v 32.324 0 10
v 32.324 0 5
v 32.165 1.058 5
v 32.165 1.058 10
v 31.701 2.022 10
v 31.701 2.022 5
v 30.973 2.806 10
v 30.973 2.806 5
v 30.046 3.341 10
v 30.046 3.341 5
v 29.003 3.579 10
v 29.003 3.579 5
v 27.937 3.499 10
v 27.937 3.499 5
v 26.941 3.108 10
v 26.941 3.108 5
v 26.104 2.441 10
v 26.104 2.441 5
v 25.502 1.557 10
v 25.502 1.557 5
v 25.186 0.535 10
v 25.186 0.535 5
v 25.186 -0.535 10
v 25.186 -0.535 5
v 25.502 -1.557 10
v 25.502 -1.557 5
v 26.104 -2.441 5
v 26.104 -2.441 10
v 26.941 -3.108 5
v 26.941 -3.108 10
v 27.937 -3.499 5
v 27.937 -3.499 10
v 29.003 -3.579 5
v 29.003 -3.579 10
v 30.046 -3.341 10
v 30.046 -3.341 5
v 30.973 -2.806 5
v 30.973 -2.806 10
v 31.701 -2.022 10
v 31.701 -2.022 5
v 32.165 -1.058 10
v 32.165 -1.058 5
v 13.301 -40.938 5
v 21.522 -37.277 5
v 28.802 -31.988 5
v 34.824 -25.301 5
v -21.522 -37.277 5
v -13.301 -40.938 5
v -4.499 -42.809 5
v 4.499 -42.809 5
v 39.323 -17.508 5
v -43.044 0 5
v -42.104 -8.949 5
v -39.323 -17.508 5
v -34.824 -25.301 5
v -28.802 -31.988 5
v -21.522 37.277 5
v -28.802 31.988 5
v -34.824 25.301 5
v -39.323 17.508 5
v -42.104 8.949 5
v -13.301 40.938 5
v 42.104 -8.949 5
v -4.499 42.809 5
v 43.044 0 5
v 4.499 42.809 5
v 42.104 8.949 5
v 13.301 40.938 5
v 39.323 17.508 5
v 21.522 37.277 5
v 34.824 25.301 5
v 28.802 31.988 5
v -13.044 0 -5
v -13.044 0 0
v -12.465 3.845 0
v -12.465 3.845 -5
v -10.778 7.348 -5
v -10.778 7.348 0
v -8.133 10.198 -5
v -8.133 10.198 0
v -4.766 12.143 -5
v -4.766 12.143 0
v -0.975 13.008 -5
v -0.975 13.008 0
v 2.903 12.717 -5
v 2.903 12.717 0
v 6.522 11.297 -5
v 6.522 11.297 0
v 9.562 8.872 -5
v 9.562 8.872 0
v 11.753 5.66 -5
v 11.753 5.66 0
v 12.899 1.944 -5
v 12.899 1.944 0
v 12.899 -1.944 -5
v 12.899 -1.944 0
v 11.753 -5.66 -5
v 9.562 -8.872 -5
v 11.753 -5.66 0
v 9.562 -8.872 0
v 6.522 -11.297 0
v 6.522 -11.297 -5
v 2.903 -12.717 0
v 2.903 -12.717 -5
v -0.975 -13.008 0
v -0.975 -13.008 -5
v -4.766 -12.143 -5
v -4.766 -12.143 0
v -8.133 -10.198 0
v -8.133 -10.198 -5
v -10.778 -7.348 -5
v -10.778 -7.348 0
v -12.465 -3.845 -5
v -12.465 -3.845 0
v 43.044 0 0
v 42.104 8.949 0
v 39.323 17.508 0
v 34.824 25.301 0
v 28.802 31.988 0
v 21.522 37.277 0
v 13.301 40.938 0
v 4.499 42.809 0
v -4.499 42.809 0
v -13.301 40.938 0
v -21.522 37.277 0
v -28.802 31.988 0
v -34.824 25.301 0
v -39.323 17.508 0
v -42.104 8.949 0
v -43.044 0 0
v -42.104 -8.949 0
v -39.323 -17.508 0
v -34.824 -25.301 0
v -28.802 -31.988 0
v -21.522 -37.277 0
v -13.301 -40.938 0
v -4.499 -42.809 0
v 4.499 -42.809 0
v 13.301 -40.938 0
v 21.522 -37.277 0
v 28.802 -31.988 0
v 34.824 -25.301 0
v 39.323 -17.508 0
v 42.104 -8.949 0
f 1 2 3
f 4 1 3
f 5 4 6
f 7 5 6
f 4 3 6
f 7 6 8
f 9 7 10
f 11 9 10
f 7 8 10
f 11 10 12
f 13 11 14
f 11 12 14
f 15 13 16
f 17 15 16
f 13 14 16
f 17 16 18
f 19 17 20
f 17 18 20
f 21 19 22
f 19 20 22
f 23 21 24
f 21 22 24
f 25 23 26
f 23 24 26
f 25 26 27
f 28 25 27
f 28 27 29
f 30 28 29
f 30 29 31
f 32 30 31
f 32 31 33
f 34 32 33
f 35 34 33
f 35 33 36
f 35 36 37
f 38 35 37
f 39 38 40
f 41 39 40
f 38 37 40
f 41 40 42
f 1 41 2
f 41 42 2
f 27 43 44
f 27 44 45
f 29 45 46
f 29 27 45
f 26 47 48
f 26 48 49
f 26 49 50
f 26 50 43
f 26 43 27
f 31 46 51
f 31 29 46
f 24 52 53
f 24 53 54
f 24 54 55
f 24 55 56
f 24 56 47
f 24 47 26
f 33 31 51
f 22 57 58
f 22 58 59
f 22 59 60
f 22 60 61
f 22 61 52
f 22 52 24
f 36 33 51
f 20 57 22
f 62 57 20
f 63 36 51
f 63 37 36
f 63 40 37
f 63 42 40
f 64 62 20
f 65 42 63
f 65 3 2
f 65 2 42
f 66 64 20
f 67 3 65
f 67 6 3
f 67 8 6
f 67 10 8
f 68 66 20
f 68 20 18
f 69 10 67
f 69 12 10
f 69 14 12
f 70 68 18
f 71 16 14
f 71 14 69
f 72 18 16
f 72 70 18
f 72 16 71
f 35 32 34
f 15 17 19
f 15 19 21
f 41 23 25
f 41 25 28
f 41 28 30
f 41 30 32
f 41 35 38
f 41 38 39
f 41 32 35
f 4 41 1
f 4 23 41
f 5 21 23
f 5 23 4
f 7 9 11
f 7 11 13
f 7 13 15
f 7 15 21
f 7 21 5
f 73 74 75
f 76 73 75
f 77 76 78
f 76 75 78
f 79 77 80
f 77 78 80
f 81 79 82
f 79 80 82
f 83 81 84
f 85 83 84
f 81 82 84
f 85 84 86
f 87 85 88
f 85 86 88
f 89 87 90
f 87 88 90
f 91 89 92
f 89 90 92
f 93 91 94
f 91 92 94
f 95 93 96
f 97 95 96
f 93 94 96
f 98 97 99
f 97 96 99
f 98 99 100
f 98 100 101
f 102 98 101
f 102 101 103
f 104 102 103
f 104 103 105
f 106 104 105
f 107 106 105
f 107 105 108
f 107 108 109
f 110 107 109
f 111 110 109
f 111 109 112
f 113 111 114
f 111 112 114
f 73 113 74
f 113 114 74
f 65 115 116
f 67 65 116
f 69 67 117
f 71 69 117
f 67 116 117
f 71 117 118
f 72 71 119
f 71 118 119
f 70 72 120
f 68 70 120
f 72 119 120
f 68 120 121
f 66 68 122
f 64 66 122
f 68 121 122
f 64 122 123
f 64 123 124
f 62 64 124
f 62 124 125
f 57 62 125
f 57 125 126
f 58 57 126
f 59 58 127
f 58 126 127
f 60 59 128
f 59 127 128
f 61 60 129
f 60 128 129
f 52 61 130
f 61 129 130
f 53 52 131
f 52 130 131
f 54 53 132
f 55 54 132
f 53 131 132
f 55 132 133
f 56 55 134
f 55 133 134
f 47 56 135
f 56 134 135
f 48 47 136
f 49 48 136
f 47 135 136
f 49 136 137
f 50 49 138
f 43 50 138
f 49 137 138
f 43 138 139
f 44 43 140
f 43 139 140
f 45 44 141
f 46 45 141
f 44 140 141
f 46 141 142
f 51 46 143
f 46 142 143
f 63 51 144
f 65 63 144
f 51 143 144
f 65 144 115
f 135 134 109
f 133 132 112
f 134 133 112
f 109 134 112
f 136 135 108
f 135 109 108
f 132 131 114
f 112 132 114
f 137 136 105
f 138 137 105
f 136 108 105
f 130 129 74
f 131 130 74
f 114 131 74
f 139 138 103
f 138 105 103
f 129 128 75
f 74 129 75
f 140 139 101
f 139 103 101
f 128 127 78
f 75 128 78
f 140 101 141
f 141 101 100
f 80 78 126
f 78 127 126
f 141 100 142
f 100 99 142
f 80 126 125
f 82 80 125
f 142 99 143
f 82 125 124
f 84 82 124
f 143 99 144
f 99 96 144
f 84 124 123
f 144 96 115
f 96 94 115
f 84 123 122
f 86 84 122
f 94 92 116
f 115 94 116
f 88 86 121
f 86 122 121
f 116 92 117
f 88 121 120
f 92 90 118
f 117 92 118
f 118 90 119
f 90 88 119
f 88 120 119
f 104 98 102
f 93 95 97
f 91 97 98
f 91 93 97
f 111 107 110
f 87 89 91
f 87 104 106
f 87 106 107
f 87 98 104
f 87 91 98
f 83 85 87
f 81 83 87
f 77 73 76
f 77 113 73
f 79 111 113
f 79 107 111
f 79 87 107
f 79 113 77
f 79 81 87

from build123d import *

# Parameters (mm, degrees)
SKETCH2_R           = 43.044310864
BOSS_EXTRUDE1_DEPTH = 5
SKETCH3_R           = 3.589046815
BOSS_EXTRUDE2_DEPTH = 5
SKETCH4_R           = 13.044310864
BOSS_EXTRUDE3_DEPTH = 5


with BuildPart() as part:
    # Sketch2 → Boss-Extrude1 (new body)
    with BuildSketch(Plane.XY):
        Circle(SKETCH2_R)
    extrude(amount=BOSS_EXTRUDE1_DEPTH)

    # Sketch3 → Boss-Extrude2 (add)
    with BuildSketch(Plane.XY.offset(5)):
        with Locations((28.73518241, 0)):
            Circle(SKETCH3_R)
    extrude(amount=BOSS_EXTRUDE2_DEPTH)

    # Sketch4 → Boss-Extrude3 (add)
    with BuildSketch(Plane(origin=(0, 0, 0), x_dir=(-1, 0, 0), z_dir=(0, 0, -1))):
        Circle(SKETCH4_R)
    extrude(amount=BOSS_EXTRUDE3_DEPTH)


solid = part.part
